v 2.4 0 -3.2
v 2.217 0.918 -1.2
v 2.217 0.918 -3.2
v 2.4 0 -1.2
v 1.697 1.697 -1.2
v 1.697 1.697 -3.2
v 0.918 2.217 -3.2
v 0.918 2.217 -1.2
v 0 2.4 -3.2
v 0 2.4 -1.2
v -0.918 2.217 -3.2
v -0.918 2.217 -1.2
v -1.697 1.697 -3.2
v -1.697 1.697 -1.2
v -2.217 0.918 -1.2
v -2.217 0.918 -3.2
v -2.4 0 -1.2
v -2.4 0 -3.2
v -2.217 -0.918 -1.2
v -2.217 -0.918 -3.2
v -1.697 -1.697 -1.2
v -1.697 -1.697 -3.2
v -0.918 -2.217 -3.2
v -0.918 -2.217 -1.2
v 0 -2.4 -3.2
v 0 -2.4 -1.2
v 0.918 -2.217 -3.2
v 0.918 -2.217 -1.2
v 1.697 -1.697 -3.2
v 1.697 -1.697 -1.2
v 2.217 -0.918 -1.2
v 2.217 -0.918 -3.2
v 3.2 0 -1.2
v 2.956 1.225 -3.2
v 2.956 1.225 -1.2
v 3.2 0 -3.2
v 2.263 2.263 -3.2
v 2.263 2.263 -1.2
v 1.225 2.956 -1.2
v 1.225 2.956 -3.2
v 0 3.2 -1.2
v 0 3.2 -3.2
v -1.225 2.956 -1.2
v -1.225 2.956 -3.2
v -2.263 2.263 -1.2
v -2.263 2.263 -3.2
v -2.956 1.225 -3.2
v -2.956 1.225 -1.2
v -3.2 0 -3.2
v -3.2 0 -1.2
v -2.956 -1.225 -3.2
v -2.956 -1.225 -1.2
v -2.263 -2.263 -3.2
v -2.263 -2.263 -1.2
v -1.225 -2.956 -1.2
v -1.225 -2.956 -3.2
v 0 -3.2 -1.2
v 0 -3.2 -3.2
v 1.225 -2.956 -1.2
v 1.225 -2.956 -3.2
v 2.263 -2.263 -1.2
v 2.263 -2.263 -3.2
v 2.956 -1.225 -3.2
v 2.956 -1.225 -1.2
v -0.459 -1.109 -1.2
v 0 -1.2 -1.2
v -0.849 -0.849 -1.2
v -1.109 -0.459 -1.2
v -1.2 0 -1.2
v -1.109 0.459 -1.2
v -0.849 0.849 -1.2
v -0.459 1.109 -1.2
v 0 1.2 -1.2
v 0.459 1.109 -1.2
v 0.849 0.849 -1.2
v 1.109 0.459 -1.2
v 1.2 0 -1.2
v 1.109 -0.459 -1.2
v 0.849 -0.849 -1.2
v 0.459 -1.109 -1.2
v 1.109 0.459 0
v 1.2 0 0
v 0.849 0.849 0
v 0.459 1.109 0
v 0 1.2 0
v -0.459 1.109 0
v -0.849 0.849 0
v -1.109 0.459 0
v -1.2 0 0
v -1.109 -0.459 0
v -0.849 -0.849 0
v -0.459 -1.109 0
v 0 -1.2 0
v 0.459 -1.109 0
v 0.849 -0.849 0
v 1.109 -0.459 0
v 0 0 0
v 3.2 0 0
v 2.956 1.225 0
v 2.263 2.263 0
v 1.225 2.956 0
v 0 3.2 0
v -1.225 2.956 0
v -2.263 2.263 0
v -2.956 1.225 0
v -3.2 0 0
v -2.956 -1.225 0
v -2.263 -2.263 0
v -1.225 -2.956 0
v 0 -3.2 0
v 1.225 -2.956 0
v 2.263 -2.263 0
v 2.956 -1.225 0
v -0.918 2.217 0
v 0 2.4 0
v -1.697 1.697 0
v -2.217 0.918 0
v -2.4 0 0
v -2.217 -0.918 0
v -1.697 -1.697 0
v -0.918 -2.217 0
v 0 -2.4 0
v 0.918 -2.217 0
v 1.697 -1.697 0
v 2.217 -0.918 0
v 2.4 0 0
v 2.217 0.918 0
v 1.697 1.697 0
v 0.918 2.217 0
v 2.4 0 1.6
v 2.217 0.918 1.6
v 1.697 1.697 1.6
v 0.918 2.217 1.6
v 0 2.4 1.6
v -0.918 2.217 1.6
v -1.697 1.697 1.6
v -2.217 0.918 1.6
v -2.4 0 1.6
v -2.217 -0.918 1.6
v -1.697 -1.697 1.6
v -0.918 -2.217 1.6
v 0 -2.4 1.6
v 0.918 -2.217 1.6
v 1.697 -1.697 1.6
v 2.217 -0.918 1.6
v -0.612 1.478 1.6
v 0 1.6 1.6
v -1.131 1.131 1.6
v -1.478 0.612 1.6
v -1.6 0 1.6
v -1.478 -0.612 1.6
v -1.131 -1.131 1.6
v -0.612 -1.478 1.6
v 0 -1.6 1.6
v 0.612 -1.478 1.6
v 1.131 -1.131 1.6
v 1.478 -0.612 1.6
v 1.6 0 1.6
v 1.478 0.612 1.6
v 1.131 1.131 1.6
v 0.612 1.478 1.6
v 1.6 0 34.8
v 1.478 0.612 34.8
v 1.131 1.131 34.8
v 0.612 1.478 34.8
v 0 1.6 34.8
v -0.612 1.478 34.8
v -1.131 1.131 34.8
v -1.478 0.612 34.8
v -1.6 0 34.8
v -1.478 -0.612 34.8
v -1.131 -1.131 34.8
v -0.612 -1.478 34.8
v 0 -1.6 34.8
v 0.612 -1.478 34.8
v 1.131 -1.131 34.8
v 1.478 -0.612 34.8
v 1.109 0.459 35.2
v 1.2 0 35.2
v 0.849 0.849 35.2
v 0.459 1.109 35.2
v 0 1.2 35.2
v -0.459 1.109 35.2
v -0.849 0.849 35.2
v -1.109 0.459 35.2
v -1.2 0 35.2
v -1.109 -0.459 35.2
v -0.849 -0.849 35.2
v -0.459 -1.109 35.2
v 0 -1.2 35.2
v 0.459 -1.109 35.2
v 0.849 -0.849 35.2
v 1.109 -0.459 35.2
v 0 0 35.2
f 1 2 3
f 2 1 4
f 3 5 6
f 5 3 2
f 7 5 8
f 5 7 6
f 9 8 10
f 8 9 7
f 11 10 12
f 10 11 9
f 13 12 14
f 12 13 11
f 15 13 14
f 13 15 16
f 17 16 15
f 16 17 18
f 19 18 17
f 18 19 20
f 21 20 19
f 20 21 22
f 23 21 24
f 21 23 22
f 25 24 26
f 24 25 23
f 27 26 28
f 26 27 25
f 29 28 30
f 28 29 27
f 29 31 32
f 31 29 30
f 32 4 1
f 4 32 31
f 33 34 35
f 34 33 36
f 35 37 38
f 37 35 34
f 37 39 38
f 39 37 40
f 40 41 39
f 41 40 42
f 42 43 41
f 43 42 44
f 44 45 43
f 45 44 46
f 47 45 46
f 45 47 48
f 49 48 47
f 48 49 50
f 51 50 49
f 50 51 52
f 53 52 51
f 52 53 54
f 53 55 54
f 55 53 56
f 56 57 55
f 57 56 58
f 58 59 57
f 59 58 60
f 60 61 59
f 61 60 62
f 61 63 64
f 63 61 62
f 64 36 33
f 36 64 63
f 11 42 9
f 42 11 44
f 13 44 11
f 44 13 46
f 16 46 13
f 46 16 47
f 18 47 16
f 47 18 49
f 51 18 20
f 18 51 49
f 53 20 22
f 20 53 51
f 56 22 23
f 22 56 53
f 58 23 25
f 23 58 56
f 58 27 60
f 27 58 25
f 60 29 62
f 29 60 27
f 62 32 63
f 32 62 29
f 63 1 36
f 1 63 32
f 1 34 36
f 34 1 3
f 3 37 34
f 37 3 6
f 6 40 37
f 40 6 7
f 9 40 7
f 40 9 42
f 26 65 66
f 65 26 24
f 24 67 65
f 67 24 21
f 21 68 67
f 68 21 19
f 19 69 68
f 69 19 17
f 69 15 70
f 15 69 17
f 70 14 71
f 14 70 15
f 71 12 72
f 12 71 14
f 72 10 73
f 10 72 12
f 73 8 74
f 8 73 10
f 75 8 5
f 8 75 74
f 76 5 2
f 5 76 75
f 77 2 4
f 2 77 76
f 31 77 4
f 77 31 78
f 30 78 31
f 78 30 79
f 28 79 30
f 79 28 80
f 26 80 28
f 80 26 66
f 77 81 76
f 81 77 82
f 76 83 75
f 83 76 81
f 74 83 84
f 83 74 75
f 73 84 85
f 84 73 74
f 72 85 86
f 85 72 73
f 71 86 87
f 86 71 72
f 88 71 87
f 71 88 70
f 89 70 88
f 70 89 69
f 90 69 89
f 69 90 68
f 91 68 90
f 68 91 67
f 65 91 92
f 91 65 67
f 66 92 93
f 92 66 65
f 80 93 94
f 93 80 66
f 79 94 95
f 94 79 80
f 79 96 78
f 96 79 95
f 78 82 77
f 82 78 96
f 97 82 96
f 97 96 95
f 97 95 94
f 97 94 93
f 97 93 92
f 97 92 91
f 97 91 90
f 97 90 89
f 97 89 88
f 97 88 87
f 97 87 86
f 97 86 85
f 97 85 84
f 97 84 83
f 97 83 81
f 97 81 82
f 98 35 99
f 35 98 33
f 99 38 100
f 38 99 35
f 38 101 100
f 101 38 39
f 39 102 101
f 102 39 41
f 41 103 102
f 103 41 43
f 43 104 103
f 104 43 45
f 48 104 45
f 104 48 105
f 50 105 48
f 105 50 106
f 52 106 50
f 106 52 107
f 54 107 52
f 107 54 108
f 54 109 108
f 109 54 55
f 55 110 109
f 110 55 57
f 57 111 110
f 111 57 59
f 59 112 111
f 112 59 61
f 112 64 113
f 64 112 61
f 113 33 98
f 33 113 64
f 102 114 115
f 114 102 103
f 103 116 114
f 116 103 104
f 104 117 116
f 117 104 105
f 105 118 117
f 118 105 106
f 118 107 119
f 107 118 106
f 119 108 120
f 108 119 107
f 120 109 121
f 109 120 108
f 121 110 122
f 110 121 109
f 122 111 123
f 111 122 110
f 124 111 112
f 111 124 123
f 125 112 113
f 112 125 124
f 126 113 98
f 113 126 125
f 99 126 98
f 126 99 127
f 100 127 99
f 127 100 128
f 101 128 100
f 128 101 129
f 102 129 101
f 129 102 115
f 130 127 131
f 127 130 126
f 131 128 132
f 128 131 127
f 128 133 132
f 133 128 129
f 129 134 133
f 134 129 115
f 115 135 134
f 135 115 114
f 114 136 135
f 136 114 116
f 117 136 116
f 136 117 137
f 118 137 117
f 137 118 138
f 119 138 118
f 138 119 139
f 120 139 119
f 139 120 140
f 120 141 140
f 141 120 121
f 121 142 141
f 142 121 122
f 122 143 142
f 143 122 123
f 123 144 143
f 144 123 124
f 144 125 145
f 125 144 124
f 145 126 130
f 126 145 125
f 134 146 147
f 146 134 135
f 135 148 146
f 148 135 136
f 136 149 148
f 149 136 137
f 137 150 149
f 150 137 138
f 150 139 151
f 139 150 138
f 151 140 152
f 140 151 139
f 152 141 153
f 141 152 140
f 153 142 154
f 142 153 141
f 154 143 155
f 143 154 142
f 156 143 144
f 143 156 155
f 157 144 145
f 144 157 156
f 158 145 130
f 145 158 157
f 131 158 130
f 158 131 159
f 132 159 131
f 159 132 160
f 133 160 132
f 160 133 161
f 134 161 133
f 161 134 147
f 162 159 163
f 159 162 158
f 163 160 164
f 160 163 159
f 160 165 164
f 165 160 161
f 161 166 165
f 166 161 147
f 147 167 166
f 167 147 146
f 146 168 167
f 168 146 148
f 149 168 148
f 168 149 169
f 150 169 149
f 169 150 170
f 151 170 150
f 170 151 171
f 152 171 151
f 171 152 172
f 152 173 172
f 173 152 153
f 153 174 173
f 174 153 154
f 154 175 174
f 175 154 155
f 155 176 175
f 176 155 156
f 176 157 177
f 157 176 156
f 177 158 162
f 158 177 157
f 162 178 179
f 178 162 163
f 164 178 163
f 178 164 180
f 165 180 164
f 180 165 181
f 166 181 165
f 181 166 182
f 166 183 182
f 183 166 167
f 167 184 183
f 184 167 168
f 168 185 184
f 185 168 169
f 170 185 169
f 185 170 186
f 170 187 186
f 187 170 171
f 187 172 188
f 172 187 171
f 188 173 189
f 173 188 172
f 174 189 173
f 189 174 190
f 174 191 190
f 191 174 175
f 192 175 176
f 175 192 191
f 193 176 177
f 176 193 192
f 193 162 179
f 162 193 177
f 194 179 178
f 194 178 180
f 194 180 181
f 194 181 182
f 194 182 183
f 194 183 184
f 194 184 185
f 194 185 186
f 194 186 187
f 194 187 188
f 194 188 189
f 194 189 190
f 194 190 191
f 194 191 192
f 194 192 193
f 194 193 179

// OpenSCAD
use <../lib.scad>
use <../p/4-4con3.scad>
use <../p/4-4cyli.scad>
use <../p/4-4disc.scad>
use <../p/4-4edge.scad>
use <../p/4-4ring1.scad>
use <../p/4-4ring2.scad>
use <../p/4-4ring3.scad>
use <../p/stud4a.scad>
$fa=1; $fs=0.2;
function ldraw_lib__3957b(realsolid=false) = [
// 0 Antenna  4H with Flat Top
// 0 Name: 3957b.dat
// 0 Author: Greg Teft [gregteft]
// 0 !LDRAW_ORG Part UPDATE 2012-01
// 0 !LICENSE Licensed under CC BY 2.0 and CC BY 4.0 : see CAreadme.txt
// 
// 0 BFC CERTIFY CCW
  [0,"BFC","CERTIFY"],
  [0,"BFC","CCW"],
// 
// 0 !HISTORY 2012-03-30 [PTadmin] Official Update 2012-01
// 
// 
// 1 16 0 3 0 1 0 0 0 -1.25 0 0 0 1 stud4a.dat
  [1,16,0,3,0,1,0,0,0,-1.25,0,0,0,1, ldraw_lib__stud4a(realsolid)],
// 0 // inside
// 1 16 0 3 0 6 0 0 0 1 0 0 0 6 4-4edge.dat
  [1,16,0,3,0,6,0,0,0,1,0,0,0,6, ldraw_lib__4_4edge(realsolid)],
// 1 16 0 3 0 3 0 0 0 -1 0 0 0 -3 4-4ring1.dat
  [1,16,0,3,0,3,0,0,0,-1,0,0,0,-3, ldraw_lib__4_4ring1(realsolid)],
// 1 16 0 3 0 3 0 0 0 1 0 0 0 3 4-4edge.dat
  [1,16,0,3,0,3,0,0,0,1,0,0,0,3, ldraw_lib__4_4edge(realsolid)],
// 0 BFC INVERTNEXT
  [0,"BFC","INVERTNEXT"],
// 1 16 0 0 0 3 0 0 0 3 0 0 0 3 4-4cyli.dat
  [1,16,0,0,0,3,0,0,0,3,0,0,0,3, ldraw_lib__4_4cyli(realsolid)],
// 1 16 0 0 0 3 0 0 0 1 0 0 0 3 4-4edge.dat
  [1,16,0,0,0,3,0,0,0,1,0,0,0,3, ldraw_lib__4_4edge(realsolid)],
// 1 16 0 0 0 3 0 0 0 -1 0 0 0 -3 4-4disc.dat
  [1,16,0,0,0,3,0,0,0,-1,0,0,0,-3, ldraw_lib__4_4disc(realsolid)],
// 0 // outside
// 1 16 0 0 0 8 0 0 0 3 0 0 0 8 4-4cyli.dat
  [1,16,0,0,0,8,0,0,0,3,0,0,0,8, ldraw_lib__4_4cyli(realsolid)],
// 1 16 0 0 0 8 0 0 0 1 0 0 0 8 4-4edge.dat
  [1,16,0,0,0,8,0,0,0,1,0,0,0,8, ldraw_lib__4_4edge(realsolid)],
// 1 16 0 0 0 2 0 0 0 1 0 0 0 2 4-4ring3.dat
  [1,16,0,0,0,2,0,0,0,1,0,0,0,2, ldraw_lib__4_4ring3(realsolid)],
// 1 16 0 0 0 6 0 0 0 1 0 0 0 6 4-4edge.dat
  [1,16,0,0,0,6,0,0,0,1,0,0,0,6, ldraw_lib__4_4edge(realsolid)],
// 1 16 0 -4 0 6 0 0 0 4 0 0 0 6 4-4cyli.dat
  [1,16,0,-4,0,6,0,0,0,4,0,0,0,6, ldraw_lib__4_4cyli(realsolid)],
// 1 16 0 -4 0 6 0 0 0 1 0 0 0 6 4-4edge.dat
  [1,16,0,-4,0,6,0,0,0,1,0,0,0,6, ldraw_lib__4_4edge(realsolid)],
// 1 16 0 -4 0 2 0 0 0 1 0 0 0 2 4-4ring2.dat
  [1,16,0,-4,0,2,0,0,0,1,0,0,0,2, ldraw_lib__4_4ring2(realsolid)],
// 1 16 0 -4 0 4 0 0 0 1 0 0 0 4 4-4edge.dat
  [1,16,0,-4,0,4,0,0,0,1,0,0,0,4, ldraw_lib__4_4edge(realsolid)],
// 1 16 0 -87 0 4 0 0 0 83 0 0 0 4 4-4cyli.dat
  [1,16,0,-87,0,4,0,0,0,83,0,0,0,4, ldraw_lib__4_4cyli(realsolid)],
// 1 16 0 -87 0 4 0 0 0 1 0 0 0 4 4-4edge.dat
  [1,16,0,-87,0,4,0,0,0,1,0,0,0,4, ldraw_lib__4_4edge(realsolid)],
// 1 16 0 -87 0 1 0 0 0 -1 0 0 0 1 4-4con3.dat
  [1,16,0,-87,0,1,0,0,0,-1,0,0,0,1, ldraw_lib__4_4con3(realsolid)],
// 1 16 0 -88 0 3 0 0 0 1 0 0 0 3 4-4edge.dat
  [1,16,0,-88,0,3,0,0,0,1,0,0,0,3, ldraw_lib__4_4edge(realsolid)],
// 1 16 0 -88 0 3 0 0 0 1 0 0 0 3 4-4disc.dat
  [1,16,0,-88,0,3,0,0,0,1,0,0,0,3, ldraw_lib__4_4disc(realsolid)],
// 0
// 
];
module ldraw_lib__3957b(step=0, col=false, unit=2/5, alt=false, line=0.2, solid=!$preview)
    makepoly(ldraw_lib__3957b(solid), step=step, col=col, unit=unit, alt=alt, line=line, solid=solid);
ldraw_lib__3957b(line=0.2);
